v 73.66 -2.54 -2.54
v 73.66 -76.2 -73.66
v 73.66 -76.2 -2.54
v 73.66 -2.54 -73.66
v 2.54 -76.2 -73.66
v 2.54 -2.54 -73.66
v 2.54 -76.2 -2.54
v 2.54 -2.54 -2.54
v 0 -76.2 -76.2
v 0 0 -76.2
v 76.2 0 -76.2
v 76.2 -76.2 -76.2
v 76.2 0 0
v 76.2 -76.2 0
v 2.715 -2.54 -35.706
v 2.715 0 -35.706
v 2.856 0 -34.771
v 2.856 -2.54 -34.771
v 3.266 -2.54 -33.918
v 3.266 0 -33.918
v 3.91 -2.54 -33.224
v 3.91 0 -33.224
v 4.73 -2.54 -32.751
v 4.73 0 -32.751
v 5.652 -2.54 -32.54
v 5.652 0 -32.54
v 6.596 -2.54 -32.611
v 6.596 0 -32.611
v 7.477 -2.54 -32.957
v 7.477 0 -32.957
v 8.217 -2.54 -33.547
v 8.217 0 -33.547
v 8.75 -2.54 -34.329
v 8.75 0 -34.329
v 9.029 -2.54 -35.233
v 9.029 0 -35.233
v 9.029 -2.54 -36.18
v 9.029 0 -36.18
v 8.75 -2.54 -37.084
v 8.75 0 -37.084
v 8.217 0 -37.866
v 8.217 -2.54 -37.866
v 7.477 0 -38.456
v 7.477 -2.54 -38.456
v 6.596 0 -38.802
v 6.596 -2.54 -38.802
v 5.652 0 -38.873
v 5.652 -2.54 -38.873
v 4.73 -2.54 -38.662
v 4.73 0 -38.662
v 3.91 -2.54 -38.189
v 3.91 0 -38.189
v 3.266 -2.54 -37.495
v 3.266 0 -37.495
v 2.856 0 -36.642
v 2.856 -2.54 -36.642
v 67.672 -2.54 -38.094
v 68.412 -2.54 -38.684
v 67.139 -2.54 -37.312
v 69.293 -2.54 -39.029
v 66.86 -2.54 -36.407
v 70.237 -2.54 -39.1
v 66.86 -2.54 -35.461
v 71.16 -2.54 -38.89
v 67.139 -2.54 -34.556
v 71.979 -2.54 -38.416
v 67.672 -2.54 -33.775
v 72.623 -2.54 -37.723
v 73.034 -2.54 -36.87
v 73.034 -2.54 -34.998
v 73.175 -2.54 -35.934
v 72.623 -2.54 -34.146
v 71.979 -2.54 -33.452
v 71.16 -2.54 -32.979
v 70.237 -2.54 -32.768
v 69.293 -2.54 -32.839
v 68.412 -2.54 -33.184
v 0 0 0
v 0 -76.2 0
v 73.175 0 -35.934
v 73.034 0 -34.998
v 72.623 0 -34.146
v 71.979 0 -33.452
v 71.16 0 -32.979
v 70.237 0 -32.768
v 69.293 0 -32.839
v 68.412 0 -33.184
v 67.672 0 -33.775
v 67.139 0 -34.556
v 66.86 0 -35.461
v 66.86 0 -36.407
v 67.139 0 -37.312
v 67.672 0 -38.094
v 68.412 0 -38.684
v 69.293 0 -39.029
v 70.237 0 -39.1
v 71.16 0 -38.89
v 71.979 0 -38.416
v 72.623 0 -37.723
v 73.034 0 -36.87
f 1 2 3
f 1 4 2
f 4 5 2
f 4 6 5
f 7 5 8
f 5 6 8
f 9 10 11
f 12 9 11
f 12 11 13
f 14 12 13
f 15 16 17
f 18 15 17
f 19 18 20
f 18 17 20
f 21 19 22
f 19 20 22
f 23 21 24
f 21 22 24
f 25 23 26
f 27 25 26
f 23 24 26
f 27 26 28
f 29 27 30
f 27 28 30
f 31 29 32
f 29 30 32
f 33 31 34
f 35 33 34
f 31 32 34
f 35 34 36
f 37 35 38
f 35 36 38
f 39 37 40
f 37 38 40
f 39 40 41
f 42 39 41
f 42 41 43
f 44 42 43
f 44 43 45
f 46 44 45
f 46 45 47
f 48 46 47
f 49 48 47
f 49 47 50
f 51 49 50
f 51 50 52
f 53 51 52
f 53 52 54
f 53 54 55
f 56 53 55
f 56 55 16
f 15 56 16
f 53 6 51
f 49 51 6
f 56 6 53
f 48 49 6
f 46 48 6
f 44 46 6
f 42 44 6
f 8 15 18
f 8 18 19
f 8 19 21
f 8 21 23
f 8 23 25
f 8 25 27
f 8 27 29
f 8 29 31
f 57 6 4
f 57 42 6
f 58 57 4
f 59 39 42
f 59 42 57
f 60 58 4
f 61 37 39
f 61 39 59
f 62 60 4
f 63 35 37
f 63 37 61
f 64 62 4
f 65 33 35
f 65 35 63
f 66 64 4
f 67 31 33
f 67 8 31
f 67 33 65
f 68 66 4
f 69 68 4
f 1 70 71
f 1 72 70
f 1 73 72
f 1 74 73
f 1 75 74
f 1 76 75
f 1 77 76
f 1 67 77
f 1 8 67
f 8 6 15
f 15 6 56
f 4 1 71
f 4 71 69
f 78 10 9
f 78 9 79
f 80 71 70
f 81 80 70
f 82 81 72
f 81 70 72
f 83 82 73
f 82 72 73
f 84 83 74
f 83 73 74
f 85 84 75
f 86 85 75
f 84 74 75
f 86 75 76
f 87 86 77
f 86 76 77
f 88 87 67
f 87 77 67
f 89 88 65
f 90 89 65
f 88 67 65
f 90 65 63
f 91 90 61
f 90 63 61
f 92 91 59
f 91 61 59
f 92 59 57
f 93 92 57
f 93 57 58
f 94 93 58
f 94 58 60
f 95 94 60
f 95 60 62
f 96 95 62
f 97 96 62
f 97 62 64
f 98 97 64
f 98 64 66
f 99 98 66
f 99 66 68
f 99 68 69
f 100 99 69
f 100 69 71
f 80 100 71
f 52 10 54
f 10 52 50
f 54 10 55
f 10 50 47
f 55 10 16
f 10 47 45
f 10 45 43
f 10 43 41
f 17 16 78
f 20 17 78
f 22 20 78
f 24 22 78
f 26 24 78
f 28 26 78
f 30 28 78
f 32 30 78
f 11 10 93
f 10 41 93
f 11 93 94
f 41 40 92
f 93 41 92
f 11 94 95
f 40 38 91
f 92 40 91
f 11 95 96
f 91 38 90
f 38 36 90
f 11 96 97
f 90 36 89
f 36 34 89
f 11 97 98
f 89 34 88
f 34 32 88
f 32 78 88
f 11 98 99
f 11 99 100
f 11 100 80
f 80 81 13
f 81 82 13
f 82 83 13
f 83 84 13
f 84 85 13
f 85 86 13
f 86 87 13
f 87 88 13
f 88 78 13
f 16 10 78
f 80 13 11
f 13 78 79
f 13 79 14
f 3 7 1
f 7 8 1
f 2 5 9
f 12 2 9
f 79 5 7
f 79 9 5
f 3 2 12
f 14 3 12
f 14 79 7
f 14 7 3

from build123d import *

# Parameters (mm, degrees)
F0_W     = 76.2
F0_H     = 76.2
F1_DEPTH = 76.2
F2_T     = -2.54
F4_D     = 6.35
F6_D     = 6.35


with BuildPart() as f1:
    # F0 (on Front) → F1 (new body)
    with BuildSketch(Plane.XZ):
        with Locations((38.1, -38.1)):
            Rectangle(F0_W, F0_H)
    extrude(amount=F1_DEPTH)

    # F2
    f2_openings = [f1.faces().sort_by_distance(p)[0] for p in [
        (38.1, -76.2, -38.1),
    ]]
    offset(amount=F2_T, openings=f2_openings)

    # F4 (through all)
    with Locations(Plane(origin=(0, 0, 0), x_dir=(-1, 0, 0), z_dir=(0, 1, 0))):
        with Locations((-69.99965, -35.934076)):
            Hole(F4_D / 2)

    # F6 (through all)
    with Locations(Plane.XZ.offset(2.54)):
        with Locations((5.889626, -35.706378)):
            Hole(F6_D / 2)


solid = f1.part
